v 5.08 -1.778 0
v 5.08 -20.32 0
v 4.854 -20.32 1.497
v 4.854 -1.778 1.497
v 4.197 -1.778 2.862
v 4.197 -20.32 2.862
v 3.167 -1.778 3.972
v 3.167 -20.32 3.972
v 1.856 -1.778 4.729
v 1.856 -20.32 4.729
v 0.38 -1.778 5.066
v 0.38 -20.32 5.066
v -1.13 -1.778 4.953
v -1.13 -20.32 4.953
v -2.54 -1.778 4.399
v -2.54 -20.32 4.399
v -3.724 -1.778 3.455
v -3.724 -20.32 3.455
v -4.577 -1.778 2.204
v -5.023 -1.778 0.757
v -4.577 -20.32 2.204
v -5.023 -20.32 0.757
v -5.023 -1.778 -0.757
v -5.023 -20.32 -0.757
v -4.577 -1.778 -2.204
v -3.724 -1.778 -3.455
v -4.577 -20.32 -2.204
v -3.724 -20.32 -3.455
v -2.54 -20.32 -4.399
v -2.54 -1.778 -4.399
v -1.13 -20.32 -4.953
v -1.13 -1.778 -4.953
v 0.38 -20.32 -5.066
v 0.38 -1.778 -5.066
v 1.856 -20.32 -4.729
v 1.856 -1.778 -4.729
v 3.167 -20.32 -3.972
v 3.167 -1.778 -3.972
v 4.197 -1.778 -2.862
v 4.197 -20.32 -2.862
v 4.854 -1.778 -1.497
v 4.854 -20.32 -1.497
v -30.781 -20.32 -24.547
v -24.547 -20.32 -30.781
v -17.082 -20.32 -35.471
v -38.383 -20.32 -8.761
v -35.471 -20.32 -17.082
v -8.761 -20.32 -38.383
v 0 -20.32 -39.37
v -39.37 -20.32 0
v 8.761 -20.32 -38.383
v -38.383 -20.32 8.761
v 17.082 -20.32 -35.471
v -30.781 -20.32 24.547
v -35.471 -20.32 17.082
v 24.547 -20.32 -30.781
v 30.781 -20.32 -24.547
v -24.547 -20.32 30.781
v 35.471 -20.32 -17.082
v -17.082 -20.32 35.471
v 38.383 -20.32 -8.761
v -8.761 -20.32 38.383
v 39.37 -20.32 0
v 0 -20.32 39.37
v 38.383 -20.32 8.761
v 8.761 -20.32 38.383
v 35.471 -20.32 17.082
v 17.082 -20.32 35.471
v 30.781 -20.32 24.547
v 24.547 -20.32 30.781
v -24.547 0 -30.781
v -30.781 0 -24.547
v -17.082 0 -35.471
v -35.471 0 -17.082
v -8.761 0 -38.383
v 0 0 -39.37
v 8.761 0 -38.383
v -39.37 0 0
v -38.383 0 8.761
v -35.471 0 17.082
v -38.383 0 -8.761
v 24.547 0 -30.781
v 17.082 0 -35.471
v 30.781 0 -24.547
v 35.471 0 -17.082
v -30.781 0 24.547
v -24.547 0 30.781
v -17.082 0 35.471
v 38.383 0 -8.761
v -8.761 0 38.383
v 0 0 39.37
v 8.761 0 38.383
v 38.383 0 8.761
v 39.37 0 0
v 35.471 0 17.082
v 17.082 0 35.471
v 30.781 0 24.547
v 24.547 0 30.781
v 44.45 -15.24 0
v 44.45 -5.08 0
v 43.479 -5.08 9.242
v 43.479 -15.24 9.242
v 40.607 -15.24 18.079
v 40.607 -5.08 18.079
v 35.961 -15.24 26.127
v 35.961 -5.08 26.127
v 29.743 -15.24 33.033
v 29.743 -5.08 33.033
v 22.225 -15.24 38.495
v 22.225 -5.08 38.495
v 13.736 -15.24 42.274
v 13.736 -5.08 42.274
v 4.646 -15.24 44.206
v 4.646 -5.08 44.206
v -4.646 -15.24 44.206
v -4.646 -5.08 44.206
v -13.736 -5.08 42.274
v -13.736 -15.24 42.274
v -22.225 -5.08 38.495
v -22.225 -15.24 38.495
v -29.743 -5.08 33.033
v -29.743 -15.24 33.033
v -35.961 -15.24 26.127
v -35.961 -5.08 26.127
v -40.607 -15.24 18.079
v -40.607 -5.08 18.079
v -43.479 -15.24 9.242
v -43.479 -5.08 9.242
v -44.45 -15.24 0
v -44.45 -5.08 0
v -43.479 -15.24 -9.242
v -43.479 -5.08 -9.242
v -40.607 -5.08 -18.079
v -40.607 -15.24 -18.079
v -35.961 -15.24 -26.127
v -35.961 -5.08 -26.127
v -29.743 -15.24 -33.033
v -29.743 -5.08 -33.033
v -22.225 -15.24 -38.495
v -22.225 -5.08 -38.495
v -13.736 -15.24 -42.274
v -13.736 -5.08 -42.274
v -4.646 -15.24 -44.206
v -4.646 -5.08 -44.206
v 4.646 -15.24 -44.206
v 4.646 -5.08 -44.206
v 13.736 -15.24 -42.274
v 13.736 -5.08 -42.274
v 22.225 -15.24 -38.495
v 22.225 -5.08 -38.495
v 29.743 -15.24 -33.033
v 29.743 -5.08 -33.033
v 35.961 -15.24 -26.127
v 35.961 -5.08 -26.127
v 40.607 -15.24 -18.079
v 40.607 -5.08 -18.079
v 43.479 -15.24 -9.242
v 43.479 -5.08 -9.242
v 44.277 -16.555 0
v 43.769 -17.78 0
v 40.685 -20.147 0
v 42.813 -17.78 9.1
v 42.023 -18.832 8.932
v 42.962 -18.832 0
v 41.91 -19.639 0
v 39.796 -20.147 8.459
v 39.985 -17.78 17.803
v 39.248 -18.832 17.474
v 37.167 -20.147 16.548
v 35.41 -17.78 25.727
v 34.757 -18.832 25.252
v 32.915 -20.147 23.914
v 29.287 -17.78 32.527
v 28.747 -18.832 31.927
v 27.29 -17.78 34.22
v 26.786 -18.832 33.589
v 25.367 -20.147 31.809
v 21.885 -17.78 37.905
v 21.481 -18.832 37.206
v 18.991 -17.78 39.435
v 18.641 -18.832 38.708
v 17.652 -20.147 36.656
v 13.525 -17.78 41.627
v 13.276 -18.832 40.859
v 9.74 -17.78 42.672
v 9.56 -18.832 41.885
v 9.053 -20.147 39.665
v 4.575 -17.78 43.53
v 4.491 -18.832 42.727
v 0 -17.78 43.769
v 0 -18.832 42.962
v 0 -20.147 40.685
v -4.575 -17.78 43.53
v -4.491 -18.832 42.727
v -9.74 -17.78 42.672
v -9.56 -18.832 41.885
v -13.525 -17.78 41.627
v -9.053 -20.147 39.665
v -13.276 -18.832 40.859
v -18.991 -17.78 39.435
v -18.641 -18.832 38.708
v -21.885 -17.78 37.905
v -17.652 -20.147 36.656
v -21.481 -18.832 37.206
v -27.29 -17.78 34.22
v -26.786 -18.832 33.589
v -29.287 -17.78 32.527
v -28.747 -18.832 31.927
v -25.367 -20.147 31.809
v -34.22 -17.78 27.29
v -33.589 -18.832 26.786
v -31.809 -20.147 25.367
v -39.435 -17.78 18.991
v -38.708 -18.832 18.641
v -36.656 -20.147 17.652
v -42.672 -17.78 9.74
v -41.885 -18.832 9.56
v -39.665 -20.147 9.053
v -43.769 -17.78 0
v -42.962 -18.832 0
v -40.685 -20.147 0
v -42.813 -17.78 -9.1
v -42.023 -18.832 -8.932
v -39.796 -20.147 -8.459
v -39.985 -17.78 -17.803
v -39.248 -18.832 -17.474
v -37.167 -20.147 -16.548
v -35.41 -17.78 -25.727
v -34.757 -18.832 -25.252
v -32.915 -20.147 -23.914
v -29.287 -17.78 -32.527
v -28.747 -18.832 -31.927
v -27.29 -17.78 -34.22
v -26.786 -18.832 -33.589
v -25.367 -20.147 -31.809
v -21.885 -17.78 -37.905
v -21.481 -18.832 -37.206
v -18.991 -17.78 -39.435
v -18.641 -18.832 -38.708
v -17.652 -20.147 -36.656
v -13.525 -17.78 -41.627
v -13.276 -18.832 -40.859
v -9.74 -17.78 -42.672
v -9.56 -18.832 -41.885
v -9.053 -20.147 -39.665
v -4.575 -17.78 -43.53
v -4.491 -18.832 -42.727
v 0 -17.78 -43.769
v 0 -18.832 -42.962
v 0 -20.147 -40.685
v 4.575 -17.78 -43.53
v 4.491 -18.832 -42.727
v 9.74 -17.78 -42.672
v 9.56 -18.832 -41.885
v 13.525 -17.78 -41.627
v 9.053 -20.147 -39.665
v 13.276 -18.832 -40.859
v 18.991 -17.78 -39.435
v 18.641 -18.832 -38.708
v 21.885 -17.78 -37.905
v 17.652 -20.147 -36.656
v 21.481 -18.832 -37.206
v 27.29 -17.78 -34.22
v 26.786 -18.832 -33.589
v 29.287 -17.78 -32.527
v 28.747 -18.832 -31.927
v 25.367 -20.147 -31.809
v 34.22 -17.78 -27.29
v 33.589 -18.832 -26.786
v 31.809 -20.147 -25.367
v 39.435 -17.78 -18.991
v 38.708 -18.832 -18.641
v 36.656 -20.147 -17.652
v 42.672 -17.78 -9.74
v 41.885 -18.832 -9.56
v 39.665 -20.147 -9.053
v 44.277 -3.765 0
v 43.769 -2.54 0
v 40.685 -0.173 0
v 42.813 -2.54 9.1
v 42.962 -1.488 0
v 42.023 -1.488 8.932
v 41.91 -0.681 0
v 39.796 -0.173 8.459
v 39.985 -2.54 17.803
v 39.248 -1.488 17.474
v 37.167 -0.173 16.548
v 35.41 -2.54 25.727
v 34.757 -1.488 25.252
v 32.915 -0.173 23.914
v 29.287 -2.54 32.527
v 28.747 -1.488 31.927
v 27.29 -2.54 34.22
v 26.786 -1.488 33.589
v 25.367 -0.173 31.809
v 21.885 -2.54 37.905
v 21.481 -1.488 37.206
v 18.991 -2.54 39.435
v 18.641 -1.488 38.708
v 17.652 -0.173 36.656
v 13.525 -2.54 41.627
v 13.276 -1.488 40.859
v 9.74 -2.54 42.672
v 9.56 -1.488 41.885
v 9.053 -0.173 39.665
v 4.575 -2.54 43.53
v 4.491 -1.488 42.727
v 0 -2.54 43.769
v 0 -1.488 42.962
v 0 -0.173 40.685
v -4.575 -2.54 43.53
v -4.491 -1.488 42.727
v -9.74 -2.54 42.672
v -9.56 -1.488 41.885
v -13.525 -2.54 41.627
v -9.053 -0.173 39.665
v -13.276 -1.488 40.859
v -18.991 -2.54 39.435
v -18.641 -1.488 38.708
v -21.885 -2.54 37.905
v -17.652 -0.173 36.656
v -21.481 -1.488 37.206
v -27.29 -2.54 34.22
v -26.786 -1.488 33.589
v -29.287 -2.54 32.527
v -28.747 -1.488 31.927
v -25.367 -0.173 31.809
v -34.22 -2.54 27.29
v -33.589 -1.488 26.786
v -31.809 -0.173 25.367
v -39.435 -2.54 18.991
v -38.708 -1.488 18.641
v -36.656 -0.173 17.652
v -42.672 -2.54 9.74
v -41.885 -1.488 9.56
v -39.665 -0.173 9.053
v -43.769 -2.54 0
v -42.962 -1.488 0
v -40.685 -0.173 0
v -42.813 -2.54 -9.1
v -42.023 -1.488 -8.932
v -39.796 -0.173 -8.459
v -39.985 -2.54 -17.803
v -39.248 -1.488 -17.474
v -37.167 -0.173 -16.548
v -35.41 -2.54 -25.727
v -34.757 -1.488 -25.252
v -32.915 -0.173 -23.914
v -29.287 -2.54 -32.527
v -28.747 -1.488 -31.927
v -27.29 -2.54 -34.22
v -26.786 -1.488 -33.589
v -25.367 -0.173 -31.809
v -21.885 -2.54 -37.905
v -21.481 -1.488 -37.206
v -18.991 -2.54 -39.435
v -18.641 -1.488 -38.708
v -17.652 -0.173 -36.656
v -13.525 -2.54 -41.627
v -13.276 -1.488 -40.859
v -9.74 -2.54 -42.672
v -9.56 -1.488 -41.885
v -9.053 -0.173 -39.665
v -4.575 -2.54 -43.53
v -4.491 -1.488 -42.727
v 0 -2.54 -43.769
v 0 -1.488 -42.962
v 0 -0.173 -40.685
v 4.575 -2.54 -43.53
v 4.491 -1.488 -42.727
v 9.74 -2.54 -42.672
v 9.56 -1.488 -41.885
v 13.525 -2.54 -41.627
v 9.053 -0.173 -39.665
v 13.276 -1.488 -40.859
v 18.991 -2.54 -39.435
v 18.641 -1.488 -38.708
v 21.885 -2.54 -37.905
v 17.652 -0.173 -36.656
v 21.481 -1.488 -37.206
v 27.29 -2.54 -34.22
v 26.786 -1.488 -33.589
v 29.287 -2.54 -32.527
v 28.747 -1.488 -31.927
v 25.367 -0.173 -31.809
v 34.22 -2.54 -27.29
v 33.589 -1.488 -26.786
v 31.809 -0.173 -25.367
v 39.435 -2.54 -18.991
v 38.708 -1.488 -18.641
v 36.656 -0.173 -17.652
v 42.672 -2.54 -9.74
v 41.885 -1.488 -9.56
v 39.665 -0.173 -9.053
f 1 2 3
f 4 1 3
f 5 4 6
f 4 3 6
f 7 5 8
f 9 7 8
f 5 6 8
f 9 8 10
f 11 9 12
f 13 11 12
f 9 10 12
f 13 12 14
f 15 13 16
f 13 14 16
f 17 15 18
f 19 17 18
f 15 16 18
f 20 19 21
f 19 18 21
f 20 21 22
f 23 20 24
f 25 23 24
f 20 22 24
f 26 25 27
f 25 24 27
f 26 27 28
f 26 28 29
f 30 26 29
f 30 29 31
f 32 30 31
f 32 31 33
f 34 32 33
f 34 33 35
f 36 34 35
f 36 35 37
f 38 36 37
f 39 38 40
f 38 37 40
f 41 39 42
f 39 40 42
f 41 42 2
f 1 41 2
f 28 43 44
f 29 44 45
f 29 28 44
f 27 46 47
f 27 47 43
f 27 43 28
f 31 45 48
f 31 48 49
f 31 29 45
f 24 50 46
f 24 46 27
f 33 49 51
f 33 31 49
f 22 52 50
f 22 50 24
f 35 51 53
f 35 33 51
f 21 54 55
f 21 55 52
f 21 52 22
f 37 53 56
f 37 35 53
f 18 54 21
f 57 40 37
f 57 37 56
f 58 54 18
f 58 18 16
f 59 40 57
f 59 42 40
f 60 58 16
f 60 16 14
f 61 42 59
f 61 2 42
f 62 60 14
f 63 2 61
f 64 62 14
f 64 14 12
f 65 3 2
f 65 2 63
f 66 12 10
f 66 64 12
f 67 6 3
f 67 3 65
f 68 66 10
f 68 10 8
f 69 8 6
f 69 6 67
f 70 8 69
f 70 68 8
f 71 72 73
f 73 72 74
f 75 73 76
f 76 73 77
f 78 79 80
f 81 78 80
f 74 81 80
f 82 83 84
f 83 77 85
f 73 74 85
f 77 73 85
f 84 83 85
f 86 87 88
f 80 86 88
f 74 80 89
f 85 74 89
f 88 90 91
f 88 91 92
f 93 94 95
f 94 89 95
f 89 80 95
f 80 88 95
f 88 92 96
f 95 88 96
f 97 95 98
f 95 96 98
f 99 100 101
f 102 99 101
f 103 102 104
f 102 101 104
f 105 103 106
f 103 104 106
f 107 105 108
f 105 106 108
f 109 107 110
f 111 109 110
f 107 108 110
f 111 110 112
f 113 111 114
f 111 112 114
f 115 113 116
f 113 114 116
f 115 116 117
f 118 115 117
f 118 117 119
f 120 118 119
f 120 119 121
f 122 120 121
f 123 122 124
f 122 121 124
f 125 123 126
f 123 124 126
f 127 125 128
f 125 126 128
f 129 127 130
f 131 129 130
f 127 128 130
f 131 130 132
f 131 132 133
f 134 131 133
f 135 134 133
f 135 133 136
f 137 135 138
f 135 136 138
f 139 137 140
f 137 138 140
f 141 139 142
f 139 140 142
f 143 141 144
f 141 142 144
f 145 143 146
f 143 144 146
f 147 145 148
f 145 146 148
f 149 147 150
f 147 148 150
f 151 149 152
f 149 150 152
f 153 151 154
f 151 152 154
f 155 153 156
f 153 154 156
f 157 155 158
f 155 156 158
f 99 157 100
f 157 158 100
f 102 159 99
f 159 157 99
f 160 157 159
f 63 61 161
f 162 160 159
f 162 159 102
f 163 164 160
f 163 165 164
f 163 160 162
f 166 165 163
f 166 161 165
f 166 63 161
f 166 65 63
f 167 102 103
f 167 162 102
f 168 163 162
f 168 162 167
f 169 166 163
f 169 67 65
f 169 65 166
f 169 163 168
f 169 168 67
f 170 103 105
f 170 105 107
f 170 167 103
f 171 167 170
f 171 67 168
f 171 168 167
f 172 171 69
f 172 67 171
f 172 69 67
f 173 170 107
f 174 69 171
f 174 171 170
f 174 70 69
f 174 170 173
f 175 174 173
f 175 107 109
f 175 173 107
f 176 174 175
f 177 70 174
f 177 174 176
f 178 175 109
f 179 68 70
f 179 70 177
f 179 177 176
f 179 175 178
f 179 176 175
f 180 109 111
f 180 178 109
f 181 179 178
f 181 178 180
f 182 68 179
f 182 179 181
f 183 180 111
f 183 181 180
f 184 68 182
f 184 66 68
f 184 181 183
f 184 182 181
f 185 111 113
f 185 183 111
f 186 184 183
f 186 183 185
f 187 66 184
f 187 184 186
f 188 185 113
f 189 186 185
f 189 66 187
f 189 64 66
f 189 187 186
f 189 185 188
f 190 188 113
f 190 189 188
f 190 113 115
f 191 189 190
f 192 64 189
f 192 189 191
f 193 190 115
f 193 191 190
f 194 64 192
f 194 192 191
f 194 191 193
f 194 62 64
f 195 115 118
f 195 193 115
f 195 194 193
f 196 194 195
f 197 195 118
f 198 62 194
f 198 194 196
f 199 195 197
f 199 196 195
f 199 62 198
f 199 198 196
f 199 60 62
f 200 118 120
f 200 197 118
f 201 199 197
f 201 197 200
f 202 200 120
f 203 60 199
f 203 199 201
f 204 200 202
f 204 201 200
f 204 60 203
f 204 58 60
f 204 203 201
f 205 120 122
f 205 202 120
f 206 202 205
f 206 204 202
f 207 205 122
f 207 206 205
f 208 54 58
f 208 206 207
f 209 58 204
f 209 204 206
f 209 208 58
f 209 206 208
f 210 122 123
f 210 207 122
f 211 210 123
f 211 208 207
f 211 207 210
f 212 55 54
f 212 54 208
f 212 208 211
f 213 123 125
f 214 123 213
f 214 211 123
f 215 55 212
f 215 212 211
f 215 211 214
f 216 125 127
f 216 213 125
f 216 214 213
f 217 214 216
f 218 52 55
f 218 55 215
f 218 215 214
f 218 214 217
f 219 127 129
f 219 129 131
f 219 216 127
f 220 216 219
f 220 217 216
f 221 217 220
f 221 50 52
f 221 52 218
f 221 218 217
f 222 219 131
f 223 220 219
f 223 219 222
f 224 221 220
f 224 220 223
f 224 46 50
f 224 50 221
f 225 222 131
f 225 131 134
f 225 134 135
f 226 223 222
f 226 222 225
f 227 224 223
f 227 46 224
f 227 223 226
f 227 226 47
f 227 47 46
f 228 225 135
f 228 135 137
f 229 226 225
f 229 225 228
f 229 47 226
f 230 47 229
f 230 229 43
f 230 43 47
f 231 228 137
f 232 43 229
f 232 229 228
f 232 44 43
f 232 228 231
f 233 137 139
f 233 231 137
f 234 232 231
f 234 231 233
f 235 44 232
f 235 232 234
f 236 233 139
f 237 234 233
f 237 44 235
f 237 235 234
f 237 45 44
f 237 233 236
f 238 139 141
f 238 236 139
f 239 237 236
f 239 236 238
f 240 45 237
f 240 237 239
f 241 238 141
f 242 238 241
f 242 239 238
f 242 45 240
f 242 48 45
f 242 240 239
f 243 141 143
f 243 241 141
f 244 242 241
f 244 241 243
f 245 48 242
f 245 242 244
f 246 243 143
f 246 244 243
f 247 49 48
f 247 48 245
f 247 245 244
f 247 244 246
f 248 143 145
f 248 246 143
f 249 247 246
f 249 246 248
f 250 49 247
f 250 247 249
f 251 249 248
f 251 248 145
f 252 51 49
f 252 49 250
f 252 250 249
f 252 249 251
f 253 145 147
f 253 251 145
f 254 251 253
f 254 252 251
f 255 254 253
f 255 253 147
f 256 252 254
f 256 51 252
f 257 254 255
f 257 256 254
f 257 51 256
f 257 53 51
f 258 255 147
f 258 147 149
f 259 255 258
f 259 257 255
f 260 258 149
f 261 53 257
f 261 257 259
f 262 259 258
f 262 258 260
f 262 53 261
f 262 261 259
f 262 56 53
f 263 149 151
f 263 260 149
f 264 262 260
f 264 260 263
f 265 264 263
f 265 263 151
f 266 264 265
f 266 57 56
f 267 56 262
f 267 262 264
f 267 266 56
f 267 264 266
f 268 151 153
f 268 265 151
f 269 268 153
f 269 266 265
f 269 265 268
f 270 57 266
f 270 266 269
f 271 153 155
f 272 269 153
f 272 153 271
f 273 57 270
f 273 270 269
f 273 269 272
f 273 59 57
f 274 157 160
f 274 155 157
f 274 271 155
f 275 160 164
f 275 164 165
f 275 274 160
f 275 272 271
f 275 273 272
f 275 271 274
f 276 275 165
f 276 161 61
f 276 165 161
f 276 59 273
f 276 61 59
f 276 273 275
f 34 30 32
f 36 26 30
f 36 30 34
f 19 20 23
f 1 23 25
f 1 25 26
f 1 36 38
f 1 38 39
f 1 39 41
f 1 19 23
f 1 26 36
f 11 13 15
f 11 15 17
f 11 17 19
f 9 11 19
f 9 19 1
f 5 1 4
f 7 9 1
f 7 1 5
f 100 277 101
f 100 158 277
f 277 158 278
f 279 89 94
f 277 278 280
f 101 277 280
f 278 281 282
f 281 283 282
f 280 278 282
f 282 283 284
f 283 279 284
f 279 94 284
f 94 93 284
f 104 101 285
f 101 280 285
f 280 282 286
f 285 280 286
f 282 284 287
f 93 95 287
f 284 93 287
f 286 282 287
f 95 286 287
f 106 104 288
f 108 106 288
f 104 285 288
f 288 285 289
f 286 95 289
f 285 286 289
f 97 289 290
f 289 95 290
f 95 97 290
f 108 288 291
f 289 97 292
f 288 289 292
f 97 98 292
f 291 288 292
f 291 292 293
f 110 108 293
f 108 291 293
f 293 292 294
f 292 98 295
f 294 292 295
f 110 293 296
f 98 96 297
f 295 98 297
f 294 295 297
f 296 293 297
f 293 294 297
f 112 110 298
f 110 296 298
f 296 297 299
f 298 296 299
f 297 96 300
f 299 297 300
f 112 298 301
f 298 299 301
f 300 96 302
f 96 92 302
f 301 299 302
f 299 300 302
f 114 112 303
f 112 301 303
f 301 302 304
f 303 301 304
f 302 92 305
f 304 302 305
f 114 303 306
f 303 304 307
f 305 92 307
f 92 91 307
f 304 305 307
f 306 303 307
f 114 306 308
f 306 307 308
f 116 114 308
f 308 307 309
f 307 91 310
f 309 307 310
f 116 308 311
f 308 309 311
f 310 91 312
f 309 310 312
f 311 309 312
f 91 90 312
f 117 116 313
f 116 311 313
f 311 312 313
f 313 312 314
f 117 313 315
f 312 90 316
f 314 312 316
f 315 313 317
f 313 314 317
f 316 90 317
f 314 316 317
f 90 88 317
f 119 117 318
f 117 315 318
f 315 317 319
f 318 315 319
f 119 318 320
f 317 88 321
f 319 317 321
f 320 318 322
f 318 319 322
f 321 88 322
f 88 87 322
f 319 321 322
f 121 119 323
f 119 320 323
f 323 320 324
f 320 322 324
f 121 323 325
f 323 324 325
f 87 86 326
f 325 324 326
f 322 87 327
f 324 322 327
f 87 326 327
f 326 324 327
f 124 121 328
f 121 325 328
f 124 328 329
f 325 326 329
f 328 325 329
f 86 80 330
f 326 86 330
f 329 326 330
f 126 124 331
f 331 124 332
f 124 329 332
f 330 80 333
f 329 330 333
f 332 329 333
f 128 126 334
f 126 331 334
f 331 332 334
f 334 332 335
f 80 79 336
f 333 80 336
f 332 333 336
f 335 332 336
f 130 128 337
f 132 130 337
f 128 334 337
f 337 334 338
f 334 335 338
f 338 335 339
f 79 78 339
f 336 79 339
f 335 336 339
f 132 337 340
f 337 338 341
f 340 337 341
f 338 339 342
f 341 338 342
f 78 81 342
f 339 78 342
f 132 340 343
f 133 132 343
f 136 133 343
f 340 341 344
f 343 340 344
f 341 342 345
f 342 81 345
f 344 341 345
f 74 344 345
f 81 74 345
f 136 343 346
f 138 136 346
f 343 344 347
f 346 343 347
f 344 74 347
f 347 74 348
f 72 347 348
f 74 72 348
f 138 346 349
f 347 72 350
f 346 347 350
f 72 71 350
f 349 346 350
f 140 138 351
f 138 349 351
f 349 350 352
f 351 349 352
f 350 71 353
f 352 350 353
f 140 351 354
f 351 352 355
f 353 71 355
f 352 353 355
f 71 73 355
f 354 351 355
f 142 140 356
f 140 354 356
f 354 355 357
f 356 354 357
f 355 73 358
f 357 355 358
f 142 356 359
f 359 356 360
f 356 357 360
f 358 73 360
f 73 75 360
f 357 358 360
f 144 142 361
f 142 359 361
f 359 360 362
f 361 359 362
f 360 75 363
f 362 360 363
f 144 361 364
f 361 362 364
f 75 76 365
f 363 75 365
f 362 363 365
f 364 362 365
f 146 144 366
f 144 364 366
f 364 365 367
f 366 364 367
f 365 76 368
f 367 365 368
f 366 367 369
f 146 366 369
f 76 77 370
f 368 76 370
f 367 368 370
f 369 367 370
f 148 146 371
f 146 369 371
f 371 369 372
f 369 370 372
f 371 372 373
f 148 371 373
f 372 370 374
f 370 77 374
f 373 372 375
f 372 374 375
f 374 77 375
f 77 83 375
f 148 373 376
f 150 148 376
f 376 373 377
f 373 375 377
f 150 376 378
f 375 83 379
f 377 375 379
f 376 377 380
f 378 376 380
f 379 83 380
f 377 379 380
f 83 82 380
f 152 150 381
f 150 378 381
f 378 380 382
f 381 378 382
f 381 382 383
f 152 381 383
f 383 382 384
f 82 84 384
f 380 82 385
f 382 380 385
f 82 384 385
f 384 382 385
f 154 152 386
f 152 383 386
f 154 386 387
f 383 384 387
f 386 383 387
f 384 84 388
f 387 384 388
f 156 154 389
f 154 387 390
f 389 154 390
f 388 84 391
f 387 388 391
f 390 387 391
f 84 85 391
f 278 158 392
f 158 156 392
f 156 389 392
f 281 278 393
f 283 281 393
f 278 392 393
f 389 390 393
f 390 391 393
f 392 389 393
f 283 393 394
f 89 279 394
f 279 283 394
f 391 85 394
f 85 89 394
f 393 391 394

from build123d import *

# Parameters (mm, degrees)
F0_R     = 44.45
F1_DEPTH = 20.32
F2_R     = 5.08
F3_DEPTH = 18.542
F4_R     = 5.08


with BuildPart() as f1:
    # F0 (on Front) → F1 (new body)
    with BuildSketch(Plane.XZ):
        Circle(F0_R)
    extrude(amount=F1_DEPTH)

    # F2 (on face) → F3 (cut)
    with BuildSketch(Plane.XZ.offset(20.32)):
        Circle(F2_R)
    extrude(amount=-F3_DEPTH, mode=Mode.SUBTRACT)

    # F4
    f4_edges = [f1.edges().sort_by_distance(p)[0] for p in [
        (-44.45, -20.32, 0),
        (-44.45, 0, 0),
    ]]
    fillet(f4_edges, radius=F4_R)


solid = f1.part
